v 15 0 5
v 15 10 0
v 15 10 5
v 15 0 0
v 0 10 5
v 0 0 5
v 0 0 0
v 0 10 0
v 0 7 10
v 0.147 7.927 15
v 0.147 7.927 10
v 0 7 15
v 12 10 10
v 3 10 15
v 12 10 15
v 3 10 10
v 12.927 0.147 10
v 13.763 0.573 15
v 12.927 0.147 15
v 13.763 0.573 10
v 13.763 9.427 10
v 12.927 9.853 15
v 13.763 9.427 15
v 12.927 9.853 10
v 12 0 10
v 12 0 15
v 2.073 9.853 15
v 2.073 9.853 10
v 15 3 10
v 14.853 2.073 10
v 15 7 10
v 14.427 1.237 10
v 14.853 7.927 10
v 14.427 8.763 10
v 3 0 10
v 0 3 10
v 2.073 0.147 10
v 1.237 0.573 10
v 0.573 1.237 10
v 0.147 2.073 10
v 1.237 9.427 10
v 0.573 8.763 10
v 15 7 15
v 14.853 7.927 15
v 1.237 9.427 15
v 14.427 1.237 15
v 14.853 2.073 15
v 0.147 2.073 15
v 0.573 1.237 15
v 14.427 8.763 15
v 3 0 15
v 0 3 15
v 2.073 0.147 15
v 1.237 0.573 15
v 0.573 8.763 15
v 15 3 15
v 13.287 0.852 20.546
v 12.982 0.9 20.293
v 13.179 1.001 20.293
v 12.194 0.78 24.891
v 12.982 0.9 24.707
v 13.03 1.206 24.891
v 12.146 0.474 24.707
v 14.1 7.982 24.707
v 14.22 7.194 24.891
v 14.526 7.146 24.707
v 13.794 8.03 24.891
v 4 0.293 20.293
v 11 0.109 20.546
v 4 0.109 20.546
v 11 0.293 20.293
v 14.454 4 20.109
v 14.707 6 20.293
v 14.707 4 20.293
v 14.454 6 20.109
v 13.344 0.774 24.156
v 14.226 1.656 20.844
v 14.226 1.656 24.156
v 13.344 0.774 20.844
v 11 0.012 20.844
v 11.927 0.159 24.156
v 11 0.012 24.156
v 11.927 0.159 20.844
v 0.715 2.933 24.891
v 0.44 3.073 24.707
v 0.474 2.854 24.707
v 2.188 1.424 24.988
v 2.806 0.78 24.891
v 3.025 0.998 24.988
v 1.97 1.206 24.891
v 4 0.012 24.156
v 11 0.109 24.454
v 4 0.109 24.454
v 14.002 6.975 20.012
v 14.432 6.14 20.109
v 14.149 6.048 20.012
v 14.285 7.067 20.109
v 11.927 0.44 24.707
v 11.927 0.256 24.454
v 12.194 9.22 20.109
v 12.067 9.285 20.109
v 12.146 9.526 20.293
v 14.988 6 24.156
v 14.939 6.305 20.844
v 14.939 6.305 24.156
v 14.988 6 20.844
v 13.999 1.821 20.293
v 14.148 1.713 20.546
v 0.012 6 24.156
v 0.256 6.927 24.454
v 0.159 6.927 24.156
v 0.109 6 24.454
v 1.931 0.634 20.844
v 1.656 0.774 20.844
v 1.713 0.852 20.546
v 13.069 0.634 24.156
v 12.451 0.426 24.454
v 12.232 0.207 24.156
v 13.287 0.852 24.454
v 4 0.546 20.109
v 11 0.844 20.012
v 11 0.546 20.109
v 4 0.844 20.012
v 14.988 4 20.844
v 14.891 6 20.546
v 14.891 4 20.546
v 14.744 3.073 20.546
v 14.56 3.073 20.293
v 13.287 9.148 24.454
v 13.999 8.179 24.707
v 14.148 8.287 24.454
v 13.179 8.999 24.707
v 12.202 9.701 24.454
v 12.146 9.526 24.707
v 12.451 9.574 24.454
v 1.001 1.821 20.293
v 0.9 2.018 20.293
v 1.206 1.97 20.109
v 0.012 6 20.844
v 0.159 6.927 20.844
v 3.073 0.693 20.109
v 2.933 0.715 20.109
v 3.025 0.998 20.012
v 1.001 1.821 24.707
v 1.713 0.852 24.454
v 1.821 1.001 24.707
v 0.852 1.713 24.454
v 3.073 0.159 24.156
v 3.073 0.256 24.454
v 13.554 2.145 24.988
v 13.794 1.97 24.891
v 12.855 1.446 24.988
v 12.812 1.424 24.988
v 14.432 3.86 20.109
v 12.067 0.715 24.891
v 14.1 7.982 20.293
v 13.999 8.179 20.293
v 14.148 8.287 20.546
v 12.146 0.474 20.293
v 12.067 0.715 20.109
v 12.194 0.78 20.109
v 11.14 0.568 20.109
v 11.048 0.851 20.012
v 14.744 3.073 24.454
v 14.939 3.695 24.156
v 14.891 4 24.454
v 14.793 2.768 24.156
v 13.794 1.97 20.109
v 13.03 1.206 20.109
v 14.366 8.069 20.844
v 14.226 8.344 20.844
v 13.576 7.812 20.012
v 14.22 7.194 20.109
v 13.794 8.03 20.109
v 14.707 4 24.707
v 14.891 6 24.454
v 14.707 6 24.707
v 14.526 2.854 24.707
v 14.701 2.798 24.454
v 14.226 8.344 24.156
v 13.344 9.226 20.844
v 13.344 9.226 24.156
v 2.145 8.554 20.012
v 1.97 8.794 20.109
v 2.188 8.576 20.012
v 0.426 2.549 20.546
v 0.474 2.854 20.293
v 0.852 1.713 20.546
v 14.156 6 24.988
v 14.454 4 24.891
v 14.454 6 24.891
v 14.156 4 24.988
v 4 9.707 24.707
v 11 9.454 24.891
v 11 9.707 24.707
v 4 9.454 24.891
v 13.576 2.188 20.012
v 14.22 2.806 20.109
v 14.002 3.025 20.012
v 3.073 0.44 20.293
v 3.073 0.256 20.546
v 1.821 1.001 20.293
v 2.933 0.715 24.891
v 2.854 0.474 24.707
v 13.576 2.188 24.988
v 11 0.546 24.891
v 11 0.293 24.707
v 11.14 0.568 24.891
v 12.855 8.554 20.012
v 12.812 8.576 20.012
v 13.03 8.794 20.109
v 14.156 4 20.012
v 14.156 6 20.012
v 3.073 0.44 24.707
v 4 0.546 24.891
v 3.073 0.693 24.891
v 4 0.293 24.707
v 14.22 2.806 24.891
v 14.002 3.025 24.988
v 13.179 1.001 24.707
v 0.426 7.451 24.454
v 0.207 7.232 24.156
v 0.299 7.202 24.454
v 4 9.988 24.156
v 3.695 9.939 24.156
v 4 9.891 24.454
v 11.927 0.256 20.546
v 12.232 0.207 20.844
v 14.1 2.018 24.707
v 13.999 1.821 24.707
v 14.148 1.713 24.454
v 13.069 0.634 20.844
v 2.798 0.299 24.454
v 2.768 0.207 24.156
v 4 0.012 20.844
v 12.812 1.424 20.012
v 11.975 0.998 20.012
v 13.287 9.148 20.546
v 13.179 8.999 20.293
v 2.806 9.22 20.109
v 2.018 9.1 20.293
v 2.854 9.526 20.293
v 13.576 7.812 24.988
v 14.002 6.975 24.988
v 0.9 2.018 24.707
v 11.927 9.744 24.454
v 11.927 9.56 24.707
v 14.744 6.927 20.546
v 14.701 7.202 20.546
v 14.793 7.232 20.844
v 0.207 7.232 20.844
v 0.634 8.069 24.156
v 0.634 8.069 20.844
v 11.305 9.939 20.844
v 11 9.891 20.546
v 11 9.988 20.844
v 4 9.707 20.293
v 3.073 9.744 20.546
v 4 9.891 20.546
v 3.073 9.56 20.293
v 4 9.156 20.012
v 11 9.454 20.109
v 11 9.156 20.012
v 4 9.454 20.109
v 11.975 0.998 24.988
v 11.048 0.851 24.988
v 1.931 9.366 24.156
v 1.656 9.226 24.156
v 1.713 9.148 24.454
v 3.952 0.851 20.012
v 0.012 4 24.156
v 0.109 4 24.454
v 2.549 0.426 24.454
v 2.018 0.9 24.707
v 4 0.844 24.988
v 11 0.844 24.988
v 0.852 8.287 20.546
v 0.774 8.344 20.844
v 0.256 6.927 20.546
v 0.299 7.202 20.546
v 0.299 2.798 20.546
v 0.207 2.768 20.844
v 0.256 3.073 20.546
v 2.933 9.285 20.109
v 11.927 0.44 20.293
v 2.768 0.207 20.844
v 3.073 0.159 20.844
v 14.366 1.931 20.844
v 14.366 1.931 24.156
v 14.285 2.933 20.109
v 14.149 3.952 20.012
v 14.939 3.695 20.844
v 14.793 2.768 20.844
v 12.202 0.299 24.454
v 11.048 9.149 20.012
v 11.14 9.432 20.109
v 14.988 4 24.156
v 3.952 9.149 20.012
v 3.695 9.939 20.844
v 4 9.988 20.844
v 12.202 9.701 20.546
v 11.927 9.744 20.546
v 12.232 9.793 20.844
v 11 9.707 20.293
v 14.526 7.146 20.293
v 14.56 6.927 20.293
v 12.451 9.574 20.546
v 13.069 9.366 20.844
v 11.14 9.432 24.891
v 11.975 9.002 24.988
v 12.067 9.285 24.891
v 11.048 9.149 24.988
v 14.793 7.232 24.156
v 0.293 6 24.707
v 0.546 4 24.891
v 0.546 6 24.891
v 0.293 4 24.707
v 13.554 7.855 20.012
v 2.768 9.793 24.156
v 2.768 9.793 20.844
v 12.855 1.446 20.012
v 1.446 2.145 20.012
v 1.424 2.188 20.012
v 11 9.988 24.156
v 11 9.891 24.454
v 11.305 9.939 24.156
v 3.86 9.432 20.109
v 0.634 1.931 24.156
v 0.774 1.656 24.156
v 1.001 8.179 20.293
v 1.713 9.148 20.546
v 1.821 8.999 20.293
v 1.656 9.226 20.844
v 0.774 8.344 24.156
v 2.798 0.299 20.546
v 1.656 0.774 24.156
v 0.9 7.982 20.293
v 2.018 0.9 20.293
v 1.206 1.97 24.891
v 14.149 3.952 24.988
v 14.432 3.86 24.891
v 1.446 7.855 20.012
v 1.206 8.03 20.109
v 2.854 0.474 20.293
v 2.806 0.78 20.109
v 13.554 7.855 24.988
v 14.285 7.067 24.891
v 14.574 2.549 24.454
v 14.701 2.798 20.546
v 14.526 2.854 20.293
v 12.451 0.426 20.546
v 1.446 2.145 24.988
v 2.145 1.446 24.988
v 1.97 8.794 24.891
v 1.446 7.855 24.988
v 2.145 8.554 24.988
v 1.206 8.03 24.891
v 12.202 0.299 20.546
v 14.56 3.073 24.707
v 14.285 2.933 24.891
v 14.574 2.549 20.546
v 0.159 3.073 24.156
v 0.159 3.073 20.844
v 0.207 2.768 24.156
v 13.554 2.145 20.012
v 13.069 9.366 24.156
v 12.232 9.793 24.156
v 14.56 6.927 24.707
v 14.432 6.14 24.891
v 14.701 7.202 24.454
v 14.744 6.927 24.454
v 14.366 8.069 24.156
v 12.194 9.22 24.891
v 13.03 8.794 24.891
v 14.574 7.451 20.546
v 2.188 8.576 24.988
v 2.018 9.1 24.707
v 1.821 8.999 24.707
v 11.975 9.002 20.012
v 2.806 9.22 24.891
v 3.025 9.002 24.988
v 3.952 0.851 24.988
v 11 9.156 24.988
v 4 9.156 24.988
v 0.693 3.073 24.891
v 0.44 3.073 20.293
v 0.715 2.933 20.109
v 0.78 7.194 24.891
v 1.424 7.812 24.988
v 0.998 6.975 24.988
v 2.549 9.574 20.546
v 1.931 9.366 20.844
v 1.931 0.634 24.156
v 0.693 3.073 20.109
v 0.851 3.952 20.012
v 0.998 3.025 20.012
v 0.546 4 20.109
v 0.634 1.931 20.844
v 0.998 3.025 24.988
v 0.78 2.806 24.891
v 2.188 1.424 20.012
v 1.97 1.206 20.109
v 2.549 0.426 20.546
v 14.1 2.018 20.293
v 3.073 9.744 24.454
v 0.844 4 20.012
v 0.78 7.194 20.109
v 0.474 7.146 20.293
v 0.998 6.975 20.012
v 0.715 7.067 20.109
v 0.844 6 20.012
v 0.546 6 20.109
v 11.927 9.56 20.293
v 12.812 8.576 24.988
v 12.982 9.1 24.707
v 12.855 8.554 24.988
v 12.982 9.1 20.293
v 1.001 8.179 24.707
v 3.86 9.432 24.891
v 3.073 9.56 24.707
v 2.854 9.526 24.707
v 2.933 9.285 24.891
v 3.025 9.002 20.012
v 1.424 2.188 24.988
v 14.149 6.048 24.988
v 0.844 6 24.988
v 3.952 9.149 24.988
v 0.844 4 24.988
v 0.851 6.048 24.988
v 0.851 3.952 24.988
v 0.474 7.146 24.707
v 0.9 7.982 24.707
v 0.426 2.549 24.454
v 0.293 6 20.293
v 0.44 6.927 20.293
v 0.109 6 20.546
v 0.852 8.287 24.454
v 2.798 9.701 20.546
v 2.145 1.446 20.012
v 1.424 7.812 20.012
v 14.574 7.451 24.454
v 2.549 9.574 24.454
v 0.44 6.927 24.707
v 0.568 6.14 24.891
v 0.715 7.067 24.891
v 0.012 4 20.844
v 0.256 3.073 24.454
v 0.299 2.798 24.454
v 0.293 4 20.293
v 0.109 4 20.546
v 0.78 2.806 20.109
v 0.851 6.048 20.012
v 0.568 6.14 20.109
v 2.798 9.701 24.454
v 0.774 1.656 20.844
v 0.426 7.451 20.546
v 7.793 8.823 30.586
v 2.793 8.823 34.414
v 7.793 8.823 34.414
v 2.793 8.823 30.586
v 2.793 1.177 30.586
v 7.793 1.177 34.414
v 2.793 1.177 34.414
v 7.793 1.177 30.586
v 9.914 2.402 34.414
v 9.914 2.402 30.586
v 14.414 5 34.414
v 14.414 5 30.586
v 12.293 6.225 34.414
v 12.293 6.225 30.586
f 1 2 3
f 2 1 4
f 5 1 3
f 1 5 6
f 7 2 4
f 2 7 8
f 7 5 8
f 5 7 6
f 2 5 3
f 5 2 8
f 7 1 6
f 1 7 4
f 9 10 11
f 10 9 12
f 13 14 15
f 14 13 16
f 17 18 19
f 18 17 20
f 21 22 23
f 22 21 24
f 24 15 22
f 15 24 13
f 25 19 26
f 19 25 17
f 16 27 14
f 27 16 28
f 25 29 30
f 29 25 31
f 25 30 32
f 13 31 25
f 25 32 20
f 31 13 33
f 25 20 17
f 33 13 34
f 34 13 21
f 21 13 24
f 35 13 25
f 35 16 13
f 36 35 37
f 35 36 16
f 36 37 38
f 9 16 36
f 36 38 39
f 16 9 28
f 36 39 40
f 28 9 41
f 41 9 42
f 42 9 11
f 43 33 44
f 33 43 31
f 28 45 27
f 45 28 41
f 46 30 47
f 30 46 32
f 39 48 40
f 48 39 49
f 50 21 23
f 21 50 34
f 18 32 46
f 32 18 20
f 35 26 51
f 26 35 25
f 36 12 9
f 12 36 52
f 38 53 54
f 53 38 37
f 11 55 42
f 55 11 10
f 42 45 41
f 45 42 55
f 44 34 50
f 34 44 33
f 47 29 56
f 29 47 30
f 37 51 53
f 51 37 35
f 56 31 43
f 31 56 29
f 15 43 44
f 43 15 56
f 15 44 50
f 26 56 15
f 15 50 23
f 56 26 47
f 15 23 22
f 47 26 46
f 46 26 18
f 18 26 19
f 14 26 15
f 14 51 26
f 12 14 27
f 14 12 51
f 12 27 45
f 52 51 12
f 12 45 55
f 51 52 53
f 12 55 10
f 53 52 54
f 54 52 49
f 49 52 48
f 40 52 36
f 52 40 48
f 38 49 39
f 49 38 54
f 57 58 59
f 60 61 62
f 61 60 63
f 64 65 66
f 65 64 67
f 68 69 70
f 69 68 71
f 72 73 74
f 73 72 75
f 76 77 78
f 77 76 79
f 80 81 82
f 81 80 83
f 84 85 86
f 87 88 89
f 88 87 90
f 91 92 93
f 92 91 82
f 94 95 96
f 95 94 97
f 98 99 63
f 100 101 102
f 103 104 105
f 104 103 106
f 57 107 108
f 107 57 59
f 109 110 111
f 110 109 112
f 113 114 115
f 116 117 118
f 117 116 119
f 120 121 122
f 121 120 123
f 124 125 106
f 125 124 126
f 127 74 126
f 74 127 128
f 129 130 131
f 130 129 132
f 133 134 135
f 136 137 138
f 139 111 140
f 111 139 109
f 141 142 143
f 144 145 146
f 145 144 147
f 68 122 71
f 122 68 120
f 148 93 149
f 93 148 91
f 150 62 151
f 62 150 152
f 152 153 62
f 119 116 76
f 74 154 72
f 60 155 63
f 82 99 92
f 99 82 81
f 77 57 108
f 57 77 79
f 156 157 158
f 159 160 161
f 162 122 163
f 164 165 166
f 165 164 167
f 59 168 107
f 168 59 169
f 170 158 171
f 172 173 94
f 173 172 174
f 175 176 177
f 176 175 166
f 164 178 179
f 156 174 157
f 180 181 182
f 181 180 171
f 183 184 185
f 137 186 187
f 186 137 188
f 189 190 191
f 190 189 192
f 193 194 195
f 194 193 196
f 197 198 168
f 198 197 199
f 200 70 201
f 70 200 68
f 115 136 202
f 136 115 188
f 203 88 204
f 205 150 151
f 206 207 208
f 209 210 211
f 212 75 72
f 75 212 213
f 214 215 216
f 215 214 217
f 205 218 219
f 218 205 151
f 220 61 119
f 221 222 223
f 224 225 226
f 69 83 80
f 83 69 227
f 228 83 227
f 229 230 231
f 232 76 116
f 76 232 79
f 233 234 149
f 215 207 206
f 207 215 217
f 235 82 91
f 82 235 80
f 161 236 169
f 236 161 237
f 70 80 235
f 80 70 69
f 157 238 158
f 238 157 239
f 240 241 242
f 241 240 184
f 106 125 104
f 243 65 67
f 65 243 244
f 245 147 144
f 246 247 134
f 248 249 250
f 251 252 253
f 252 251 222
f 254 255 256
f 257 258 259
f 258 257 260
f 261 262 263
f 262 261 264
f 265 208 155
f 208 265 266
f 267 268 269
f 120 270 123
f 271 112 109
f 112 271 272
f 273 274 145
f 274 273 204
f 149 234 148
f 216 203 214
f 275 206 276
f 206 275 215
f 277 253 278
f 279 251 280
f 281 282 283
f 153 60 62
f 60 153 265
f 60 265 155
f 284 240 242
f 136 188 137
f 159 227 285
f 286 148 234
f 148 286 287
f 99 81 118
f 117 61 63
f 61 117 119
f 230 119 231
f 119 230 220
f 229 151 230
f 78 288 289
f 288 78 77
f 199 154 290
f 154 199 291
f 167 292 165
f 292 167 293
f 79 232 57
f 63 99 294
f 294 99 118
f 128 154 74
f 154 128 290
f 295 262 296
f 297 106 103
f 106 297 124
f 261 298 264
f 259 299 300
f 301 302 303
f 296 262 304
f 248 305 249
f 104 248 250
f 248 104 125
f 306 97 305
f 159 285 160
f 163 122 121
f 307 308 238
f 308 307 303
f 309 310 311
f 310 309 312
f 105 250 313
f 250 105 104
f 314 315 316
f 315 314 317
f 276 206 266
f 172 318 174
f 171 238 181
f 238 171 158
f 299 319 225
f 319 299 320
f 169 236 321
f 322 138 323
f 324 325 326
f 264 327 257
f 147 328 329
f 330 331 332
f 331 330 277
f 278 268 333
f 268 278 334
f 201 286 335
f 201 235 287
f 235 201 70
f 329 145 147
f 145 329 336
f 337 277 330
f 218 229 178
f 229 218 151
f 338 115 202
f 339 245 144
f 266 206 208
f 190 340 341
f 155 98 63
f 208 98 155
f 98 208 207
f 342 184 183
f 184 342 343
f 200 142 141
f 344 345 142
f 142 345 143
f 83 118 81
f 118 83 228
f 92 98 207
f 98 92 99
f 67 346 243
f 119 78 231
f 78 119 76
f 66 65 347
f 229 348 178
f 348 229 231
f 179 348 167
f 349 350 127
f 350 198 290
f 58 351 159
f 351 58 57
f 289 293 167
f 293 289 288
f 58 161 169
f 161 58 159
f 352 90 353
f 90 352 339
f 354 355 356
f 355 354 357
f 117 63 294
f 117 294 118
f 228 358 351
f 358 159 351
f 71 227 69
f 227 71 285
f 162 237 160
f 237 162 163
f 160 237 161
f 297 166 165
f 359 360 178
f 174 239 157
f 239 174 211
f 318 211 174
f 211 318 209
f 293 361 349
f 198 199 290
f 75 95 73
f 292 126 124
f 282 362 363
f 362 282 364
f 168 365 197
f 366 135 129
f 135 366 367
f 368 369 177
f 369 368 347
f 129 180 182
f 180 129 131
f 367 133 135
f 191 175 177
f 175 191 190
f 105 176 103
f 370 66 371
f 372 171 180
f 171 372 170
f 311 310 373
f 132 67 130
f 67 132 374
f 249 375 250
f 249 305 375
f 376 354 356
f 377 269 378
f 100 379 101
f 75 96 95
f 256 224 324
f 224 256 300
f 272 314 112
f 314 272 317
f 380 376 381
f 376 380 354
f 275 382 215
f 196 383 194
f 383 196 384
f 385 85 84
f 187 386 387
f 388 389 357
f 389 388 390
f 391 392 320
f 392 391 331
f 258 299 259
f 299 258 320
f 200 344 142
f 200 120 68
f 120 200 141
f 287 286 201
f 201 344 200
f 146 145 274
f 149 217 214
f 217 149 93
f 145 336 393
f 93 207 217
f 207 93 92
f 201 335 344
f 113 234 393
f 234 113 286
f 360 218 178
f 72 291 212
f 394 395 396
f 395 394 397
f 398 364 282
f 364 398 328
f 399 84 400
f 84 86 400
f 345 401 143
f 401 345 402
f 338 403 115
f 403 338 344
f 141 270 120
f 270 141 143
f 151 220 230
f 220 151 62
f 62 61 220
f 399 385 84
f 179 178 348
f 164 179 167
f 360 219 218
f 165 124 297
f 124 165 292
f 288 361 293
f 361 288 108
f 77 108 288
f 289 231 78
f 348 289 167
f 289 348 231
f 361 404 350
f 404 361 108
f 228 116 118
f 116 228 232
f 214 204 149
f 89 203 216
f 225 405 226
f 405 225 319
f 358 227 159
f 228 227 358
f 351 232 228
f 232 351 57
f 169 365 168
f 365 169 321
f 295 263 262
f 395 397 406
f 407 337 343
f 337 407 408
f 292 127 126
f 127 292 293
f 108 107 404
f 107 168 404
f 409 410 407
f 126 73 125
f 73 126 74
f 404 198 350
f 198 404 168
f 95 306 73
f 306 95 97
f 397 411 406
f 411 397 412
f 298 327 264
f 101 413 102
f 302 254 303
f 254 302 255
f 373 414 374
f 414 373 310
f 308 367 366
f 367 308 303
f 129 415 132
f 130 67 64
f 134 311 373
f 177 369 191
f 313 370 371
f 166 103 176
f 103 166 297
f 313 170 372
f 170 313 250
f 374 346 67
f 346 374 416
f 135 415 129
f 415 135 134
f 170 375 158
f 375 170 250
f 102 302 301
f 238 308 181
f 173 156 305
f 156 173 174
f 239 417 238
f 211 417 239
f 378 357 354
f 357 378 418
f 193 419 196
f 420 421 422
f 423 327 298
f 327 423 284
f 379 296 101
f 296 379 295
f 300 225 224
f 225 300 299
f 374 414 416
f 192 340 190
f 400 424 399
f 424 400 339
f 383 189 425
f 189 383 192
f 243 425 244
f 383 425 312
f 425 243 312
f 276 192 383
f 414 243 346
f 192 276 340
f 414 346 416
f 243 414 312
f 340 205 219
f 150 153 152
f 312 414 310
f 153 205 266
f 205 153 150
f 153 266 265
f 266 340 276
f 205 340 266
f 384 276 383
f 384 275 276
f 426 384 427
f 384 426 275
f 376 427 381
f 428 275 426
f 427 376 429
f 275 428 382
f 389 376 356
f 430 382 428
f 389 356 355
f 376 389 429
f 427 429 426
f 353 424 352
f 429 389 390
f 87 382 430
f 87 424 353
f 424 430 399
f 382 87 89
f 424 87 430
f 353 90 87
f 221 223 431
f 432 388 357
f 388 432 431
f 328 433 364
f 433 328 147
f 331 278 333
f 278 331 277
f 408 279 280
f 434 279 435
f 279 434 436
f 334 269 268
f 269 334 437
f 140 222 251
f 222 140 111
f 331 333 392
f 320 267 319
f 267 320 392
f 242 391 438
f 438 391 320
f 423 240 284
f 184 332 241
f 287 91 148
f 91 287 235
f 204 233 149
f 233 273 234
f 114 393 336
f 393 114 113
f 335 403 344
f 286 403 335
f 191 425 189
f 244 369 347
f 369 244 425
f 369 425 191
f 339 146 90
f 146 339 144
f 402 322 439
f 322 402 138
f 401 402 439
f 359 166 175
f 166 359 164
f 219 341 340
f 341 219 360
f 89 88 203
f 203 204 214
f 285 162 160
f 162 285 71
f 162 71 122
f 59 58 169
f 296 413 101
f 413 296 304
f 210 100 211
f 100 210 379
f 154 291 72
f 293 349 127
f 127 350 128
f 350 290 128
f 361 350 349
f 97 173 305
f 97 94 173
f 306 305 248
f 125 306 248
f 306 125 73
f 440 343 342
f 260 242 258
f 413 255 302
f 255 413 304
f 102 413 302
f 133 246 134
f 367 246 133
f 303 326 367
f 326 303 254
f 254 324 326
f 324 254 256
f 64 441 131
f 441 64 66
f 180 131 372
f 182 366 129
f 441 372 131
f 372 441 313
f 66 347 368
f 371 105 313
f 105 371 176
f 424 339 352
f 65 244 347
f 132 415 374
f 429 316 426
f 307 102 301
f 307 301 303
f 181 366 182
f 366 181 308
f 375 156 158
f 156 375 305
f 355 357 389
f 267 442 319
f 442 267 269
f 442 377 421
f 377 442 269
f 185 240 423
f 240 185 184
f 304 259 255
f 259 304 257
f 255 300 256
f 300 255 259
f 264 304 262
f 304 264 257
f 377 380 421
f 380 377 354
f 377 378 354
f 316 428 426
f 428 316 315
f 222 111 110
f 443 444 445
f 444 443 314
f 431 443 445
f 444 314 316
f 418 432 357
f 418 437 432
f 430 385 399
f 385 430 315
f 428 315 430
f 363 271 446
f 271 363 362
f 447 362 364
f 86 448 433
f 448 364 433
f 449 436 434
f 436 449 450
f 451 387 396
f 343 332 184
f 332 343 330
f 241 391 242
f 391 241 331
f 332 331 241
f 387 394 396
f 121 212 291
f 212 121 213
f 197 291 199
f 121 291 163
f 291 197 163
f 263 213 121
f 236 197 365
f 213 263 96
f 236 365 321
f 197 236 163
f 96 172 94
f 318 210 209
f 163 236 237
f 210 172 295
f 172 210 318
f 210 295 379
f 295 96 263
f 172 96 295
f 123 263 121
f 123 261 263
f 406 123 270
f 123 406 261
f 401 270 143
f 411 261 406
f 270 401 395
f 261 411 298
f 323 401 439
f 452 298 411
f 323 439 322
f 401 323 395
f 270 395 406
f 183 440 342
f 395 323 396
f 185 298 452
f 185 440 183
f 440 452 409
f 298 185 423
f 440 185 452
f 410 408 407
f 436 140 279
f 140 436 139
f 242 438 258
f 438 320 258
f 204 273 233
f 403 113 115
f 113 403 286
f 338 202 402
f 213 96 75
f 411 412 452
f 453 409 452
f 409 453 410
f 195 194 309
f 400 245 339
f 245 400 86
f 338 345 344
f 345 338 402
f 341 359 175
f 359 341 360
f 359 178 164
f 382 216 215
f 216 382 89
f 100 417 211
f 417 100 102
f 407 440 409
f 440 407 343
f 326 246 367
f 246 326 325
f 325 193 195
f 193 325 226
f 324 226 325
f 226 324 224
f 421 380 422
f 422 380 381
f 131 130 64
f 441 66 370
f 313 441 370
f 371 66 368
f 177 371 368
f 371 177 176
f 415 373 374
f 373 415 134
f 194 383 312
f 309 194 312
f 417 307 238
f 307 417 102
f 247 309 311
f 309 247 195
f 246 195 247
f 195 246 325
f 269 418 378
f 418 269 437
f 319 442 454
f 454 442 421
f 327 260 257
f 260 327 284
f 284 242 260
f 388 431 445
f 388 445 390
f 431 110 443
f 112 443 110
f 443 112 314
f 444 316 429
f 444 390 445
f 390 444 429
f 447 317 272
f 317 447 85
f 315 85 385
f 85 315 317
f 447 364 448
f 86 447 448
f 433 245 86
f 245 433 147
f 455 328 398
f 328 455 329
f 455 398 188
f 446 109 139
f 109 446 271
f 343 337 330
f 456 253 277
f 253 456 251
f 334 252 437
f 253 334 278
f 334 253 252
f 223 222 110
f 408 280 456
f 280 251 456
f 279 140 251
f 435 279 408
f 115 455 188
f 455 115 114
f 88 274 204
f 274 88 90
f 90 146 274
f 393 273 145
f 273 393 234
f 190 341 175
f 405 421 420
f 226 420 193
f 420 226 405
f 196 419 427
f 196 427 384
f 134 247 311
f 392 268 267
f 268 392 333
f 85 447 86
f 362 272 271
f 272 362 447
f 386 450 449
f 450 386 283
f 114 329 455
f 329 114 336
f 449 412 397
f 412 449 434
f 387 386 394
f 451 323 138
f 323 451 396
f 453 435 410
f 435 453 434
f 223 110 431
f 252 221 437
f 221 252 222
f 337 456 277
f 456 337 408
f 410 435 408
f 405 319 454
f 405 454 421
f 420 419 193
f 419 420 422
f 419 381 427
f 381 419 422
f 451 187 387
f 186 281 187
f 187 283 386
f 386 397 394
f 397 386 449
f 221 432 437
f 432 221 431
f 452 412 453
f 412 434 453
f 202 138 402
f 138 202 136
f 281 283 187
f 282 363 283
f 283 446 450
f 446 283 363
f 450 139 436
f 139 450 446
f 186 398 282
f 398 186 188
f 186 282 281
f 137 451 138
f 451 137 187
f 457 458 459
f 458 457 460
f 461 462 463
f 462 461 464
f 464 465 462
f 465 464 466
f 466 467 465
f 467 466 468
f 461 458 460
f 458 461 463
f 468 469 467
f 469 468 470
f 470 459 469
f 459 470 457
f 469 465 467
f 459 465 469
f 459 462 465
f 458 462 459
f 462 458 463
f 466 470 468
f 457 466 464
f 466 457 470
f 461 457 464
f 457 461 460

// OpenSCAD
// A cube with the x-y corners rounded by 'corner' radius.
// Still fits inside a 'size' cube
module round(size, corner, $fn = $fn, $fa = $fa, center=false) {
  translation = (center ? [-size[0]/2, -size[1]/2, -size[2]/2]: [0,0,0]);
  translate(translation)
    hull() {
      for (x = [corner, size[0] - corner]) {
        for (y = [corner, size[1] - corner]) {
          translate([x, y, 0])
            cylinder(r=corner, h=size[2], $fn = $fn, $fa = $fa);
        }
      }
    }
}
// Makes a cube with the x-y corners rounded by 'corner' radius
// and all edges chamfered by 'chamfer' radius. Still fits inside
// a 'size' cube.
module doubleround(size, corner, chamfer, $fn1 = $fn, $fn2 = $fn, center=false)
{
  translation = (center ? [-size[0]/2, -size[1]/2, -size[2]/2]: [0,0,0]);
  translate(translation)
    minkowski(){
      translate([chamfer, chamfer, chamfer])
        round([size[0]-2*chamfer, size[1]-2*chamfer, size[2]-2*chamfer], corner, $fn = $fn1);
      sphere(r=chamfer, $fn = $fn2);
    }
}


cube([15, 10, 5]);
translate([0,0,10])
    round([15, 10, 5], 3, $fn = 20);
translate([0,0,20])
    doubleround([15,10,5], 3, 1, $fn1 = 20, $fn2 = 20);
translate([0,0,30])
    doubleround([15,10,5], 3, 2, $fn1 = 1, $fn2 = 1);
